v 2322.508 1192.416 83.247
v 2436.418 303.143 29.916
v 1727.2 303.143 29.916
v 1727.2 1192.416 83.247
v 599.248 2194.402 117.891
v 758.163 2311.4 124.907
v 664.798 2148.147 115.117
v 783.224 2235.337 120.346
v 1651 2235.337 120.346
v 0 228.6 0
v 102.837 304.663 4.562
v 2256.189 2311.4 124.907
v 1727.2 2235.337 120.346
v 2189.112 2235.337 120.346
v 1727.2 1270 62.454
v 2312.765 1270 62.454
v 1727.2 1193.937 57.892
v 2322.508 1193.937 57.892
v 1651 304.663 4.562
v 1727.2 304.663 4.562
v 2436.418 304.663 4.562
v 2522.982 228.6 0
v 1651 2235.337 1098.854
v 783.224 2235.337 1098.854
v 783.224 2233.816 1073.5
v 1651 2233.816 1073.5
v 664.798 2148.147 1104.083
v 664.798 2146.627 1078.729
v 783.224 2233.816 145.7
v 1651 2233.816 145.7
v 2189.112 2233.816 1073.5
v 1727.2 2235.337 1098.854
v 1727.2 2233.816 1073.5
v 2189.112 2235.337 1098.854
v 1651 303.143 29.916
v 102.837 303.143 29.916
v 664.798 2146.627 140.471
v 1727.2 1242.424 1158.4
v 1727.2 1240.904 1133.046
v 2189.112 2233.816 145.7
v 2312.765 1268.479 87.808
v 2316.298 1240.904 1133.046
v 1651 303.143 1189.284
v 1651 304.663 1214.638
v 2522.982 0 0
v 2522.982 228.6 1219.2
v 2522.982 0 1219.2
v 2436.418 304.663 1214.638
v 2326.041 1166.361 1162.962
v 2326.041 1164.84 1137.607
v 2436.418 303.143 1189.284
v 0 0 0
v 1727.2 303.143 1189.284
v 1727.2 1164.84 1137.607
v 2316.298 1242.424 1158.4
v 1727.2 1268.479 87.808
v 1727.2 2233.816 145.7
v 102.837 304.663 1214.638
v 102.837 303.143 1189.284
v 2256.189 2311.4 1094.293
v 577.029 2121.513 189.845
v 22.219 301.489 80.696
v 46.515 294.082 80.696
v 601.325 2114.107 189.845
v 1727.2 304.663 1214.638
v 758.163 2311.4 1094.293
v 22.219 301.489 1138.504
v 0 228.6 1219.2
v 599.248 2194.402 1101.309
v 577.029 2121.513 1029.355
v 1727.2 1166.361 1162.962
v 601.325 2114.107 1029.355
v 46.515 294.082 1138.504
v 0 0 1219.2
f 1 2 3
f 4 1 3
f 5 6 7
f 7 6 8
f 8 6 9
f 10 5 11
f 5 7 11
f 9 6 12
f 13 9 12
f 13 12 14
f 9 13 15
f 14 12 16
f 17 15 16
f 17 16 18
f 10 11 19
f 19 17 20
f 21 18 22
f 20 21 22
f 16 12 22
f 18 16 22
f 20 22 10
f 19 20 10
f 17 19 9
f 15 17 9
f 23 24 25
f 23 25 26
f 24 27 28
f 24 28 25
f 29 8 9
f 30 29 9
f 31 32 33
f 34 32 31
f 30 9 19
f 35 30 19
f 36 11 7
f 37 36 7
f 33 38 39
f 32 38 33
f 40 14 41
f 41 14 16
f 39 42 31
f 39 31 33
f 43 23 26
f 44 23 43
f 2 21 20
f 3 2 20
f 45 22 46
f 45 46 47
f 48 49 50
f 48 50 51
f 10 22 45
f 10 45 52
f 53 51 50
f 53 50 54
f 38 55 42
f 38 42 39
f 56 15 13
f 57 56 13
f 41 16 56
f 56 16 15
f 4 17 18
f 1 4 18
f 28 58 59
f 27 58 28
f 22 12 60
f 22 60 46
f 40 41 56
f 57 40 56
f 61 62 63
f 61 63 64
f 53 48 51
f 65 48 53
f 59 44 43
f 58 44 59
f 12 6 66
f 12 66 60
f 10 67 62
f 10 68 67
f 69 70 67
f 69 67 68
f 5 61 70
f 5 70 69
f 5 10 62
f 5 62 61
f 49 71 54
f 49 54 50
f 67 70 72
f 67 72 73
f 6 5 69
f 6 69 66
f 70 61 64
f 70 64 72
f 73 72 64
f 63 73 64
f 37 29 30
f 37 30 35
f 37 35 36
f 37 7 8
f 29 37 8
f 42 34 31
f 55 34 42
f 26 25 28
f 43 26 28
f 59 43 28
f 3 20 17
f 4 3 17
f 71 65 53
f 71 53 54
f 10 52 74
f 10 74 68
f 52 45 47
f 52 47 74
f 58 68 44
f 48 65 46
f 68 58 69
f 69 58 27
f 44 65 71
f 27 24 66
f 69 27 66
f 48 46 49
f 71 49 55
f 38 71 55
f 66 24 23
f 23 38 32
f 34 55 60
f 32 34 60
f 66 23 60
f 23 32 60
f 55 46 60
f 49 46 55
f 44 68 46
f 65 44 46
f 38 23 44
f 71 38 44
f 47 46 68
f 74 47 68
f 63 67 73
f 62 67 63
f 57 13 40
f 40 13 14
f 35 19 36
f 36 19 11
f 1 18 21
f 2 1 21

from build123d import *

# Parameters (mm, degrees)
BOSS_EXTRUDE1_DEPTH = 1219.2
CUT_EXTRUDE1_DEPTH  = 3633.417483209
CUT_EXTRUDE2_DEPTH  = 25.4
CUT_EXTRUDE3_DEPTH  = 25.4
CUT_EXTRUDE4_DEPTH  = 25.4


with BuildPart() as part:
    # Sketch2 → Boss-Extrude1 (new body)
    with BuildSketch(Plane.XY):
        Polygon((0, 228.6), (599.248370619, 2194.401873758), (758.16299584, 2311.4), (2256.189290748, 2311.4), (2522.982, 228.6), (2522.982, 0), (0, 0), align=None)
    extrude(amount=BOSS_EXTRUDE1_DEPTH)

    # Sketch3 → Cut-Extrude1 (cut, through all)
    with BuildSketch(Plane(origin=(2522.982, 0, 0), x_dir=(0, 0, -1), z_dir=(1, 0, 0))):
        Polygon((-1219.2, 2311.4), (-1219.2, 228.6), (-1094.292625206, 2311.4), align=None)
        Polygon((0, 2311.4), (-124.907374794, 2311.4), (0, 228.6), align=None)
    extrude(amount=-CUT_EXTRUDE1_DEPTH, mode=Mode.SUBTRACT)

    # Sketch4 → Cut-Extrude2 (cut)
    with BuildSketch(Plane(origin=(-63.760665506, 19.436584848, 0), x_dir=(0, 0, 1), z_dir=(-0.9565435532915122, 0.2915894899622553, 0))):
        Polygon((1029.355029429, 2197.575492424), (1138.503531145, 294.865856282), (80.696468855, 294.865856282), (189.844970571, 2197.575492424), align=None)
    extrude(amount=-CUT_EXTRUDE2_DEPTH, mode=Mode.SUBTRACT)

    # Sketch5 → Cut-Extrude3 (cut)
    with BuildSketch(Plane(origin=(0, 73.673705722, 1228.491068132), x_dir=(1, 0, 0), z_dir=(0, 0.0598633395783769, 0.9982065821134041))):
        Polygon((664.797989738, 2078.200755327), (783.224260037, 2165.546682876), (1651, 2165.546682876), (1651, 231.404641057), (102.836573264, 231.404641057), align=None)
        Polygon((2189.112119554, 2165.546682876), (2316.297526218, 1170.850467771), (1727.2, 1170.850467771), (1727.2, 2165.546682876), align=None)
        Polygon((2436.418421116, 231.404641057), (1727.2, 231.404641057), (1727.2, 1094.650467771), (2326.040730063, 1094.650467771), align=None)
    extrude(amount=-CUT_EXTRUDE3_DEPTH, mode=Mode.SUBTRACT)

    # Sketch6 → Cut-Extrude4 (cut)
    with BuildSketch(Plane(origin=(0, 0.819215401, -13.660216935), x_dir=(-1, 0, 0), z_dir=(0, 0.0598633395783769, -0.9982065821134041))):
        Polygon((-2189.112119554, 2238.53206649), (-2312.765270335, 1271.461045581), (-1727.2, 1271.461045581), (-1727.2, 2238.53206649), align=None)
        Polygon((-2436.418421116, 304.390024671), (-1727.2, 304.390024671), (-1727.2, 1195.261045581), (-2322.50847418, 1195.261045581), align=None)
        Polygon((-102.836573264, 304.390024671), (-664.797989738, 2151.186138941), (-783.224260037, 2238.53206649), (-1651, 2238.53206649), (-1651, 304.390024671), align=None)
    extrude(amount=-CUT_EXTRUDE4_DEPTH, mode=Mode.SUBTRACT)


solid = part.part
